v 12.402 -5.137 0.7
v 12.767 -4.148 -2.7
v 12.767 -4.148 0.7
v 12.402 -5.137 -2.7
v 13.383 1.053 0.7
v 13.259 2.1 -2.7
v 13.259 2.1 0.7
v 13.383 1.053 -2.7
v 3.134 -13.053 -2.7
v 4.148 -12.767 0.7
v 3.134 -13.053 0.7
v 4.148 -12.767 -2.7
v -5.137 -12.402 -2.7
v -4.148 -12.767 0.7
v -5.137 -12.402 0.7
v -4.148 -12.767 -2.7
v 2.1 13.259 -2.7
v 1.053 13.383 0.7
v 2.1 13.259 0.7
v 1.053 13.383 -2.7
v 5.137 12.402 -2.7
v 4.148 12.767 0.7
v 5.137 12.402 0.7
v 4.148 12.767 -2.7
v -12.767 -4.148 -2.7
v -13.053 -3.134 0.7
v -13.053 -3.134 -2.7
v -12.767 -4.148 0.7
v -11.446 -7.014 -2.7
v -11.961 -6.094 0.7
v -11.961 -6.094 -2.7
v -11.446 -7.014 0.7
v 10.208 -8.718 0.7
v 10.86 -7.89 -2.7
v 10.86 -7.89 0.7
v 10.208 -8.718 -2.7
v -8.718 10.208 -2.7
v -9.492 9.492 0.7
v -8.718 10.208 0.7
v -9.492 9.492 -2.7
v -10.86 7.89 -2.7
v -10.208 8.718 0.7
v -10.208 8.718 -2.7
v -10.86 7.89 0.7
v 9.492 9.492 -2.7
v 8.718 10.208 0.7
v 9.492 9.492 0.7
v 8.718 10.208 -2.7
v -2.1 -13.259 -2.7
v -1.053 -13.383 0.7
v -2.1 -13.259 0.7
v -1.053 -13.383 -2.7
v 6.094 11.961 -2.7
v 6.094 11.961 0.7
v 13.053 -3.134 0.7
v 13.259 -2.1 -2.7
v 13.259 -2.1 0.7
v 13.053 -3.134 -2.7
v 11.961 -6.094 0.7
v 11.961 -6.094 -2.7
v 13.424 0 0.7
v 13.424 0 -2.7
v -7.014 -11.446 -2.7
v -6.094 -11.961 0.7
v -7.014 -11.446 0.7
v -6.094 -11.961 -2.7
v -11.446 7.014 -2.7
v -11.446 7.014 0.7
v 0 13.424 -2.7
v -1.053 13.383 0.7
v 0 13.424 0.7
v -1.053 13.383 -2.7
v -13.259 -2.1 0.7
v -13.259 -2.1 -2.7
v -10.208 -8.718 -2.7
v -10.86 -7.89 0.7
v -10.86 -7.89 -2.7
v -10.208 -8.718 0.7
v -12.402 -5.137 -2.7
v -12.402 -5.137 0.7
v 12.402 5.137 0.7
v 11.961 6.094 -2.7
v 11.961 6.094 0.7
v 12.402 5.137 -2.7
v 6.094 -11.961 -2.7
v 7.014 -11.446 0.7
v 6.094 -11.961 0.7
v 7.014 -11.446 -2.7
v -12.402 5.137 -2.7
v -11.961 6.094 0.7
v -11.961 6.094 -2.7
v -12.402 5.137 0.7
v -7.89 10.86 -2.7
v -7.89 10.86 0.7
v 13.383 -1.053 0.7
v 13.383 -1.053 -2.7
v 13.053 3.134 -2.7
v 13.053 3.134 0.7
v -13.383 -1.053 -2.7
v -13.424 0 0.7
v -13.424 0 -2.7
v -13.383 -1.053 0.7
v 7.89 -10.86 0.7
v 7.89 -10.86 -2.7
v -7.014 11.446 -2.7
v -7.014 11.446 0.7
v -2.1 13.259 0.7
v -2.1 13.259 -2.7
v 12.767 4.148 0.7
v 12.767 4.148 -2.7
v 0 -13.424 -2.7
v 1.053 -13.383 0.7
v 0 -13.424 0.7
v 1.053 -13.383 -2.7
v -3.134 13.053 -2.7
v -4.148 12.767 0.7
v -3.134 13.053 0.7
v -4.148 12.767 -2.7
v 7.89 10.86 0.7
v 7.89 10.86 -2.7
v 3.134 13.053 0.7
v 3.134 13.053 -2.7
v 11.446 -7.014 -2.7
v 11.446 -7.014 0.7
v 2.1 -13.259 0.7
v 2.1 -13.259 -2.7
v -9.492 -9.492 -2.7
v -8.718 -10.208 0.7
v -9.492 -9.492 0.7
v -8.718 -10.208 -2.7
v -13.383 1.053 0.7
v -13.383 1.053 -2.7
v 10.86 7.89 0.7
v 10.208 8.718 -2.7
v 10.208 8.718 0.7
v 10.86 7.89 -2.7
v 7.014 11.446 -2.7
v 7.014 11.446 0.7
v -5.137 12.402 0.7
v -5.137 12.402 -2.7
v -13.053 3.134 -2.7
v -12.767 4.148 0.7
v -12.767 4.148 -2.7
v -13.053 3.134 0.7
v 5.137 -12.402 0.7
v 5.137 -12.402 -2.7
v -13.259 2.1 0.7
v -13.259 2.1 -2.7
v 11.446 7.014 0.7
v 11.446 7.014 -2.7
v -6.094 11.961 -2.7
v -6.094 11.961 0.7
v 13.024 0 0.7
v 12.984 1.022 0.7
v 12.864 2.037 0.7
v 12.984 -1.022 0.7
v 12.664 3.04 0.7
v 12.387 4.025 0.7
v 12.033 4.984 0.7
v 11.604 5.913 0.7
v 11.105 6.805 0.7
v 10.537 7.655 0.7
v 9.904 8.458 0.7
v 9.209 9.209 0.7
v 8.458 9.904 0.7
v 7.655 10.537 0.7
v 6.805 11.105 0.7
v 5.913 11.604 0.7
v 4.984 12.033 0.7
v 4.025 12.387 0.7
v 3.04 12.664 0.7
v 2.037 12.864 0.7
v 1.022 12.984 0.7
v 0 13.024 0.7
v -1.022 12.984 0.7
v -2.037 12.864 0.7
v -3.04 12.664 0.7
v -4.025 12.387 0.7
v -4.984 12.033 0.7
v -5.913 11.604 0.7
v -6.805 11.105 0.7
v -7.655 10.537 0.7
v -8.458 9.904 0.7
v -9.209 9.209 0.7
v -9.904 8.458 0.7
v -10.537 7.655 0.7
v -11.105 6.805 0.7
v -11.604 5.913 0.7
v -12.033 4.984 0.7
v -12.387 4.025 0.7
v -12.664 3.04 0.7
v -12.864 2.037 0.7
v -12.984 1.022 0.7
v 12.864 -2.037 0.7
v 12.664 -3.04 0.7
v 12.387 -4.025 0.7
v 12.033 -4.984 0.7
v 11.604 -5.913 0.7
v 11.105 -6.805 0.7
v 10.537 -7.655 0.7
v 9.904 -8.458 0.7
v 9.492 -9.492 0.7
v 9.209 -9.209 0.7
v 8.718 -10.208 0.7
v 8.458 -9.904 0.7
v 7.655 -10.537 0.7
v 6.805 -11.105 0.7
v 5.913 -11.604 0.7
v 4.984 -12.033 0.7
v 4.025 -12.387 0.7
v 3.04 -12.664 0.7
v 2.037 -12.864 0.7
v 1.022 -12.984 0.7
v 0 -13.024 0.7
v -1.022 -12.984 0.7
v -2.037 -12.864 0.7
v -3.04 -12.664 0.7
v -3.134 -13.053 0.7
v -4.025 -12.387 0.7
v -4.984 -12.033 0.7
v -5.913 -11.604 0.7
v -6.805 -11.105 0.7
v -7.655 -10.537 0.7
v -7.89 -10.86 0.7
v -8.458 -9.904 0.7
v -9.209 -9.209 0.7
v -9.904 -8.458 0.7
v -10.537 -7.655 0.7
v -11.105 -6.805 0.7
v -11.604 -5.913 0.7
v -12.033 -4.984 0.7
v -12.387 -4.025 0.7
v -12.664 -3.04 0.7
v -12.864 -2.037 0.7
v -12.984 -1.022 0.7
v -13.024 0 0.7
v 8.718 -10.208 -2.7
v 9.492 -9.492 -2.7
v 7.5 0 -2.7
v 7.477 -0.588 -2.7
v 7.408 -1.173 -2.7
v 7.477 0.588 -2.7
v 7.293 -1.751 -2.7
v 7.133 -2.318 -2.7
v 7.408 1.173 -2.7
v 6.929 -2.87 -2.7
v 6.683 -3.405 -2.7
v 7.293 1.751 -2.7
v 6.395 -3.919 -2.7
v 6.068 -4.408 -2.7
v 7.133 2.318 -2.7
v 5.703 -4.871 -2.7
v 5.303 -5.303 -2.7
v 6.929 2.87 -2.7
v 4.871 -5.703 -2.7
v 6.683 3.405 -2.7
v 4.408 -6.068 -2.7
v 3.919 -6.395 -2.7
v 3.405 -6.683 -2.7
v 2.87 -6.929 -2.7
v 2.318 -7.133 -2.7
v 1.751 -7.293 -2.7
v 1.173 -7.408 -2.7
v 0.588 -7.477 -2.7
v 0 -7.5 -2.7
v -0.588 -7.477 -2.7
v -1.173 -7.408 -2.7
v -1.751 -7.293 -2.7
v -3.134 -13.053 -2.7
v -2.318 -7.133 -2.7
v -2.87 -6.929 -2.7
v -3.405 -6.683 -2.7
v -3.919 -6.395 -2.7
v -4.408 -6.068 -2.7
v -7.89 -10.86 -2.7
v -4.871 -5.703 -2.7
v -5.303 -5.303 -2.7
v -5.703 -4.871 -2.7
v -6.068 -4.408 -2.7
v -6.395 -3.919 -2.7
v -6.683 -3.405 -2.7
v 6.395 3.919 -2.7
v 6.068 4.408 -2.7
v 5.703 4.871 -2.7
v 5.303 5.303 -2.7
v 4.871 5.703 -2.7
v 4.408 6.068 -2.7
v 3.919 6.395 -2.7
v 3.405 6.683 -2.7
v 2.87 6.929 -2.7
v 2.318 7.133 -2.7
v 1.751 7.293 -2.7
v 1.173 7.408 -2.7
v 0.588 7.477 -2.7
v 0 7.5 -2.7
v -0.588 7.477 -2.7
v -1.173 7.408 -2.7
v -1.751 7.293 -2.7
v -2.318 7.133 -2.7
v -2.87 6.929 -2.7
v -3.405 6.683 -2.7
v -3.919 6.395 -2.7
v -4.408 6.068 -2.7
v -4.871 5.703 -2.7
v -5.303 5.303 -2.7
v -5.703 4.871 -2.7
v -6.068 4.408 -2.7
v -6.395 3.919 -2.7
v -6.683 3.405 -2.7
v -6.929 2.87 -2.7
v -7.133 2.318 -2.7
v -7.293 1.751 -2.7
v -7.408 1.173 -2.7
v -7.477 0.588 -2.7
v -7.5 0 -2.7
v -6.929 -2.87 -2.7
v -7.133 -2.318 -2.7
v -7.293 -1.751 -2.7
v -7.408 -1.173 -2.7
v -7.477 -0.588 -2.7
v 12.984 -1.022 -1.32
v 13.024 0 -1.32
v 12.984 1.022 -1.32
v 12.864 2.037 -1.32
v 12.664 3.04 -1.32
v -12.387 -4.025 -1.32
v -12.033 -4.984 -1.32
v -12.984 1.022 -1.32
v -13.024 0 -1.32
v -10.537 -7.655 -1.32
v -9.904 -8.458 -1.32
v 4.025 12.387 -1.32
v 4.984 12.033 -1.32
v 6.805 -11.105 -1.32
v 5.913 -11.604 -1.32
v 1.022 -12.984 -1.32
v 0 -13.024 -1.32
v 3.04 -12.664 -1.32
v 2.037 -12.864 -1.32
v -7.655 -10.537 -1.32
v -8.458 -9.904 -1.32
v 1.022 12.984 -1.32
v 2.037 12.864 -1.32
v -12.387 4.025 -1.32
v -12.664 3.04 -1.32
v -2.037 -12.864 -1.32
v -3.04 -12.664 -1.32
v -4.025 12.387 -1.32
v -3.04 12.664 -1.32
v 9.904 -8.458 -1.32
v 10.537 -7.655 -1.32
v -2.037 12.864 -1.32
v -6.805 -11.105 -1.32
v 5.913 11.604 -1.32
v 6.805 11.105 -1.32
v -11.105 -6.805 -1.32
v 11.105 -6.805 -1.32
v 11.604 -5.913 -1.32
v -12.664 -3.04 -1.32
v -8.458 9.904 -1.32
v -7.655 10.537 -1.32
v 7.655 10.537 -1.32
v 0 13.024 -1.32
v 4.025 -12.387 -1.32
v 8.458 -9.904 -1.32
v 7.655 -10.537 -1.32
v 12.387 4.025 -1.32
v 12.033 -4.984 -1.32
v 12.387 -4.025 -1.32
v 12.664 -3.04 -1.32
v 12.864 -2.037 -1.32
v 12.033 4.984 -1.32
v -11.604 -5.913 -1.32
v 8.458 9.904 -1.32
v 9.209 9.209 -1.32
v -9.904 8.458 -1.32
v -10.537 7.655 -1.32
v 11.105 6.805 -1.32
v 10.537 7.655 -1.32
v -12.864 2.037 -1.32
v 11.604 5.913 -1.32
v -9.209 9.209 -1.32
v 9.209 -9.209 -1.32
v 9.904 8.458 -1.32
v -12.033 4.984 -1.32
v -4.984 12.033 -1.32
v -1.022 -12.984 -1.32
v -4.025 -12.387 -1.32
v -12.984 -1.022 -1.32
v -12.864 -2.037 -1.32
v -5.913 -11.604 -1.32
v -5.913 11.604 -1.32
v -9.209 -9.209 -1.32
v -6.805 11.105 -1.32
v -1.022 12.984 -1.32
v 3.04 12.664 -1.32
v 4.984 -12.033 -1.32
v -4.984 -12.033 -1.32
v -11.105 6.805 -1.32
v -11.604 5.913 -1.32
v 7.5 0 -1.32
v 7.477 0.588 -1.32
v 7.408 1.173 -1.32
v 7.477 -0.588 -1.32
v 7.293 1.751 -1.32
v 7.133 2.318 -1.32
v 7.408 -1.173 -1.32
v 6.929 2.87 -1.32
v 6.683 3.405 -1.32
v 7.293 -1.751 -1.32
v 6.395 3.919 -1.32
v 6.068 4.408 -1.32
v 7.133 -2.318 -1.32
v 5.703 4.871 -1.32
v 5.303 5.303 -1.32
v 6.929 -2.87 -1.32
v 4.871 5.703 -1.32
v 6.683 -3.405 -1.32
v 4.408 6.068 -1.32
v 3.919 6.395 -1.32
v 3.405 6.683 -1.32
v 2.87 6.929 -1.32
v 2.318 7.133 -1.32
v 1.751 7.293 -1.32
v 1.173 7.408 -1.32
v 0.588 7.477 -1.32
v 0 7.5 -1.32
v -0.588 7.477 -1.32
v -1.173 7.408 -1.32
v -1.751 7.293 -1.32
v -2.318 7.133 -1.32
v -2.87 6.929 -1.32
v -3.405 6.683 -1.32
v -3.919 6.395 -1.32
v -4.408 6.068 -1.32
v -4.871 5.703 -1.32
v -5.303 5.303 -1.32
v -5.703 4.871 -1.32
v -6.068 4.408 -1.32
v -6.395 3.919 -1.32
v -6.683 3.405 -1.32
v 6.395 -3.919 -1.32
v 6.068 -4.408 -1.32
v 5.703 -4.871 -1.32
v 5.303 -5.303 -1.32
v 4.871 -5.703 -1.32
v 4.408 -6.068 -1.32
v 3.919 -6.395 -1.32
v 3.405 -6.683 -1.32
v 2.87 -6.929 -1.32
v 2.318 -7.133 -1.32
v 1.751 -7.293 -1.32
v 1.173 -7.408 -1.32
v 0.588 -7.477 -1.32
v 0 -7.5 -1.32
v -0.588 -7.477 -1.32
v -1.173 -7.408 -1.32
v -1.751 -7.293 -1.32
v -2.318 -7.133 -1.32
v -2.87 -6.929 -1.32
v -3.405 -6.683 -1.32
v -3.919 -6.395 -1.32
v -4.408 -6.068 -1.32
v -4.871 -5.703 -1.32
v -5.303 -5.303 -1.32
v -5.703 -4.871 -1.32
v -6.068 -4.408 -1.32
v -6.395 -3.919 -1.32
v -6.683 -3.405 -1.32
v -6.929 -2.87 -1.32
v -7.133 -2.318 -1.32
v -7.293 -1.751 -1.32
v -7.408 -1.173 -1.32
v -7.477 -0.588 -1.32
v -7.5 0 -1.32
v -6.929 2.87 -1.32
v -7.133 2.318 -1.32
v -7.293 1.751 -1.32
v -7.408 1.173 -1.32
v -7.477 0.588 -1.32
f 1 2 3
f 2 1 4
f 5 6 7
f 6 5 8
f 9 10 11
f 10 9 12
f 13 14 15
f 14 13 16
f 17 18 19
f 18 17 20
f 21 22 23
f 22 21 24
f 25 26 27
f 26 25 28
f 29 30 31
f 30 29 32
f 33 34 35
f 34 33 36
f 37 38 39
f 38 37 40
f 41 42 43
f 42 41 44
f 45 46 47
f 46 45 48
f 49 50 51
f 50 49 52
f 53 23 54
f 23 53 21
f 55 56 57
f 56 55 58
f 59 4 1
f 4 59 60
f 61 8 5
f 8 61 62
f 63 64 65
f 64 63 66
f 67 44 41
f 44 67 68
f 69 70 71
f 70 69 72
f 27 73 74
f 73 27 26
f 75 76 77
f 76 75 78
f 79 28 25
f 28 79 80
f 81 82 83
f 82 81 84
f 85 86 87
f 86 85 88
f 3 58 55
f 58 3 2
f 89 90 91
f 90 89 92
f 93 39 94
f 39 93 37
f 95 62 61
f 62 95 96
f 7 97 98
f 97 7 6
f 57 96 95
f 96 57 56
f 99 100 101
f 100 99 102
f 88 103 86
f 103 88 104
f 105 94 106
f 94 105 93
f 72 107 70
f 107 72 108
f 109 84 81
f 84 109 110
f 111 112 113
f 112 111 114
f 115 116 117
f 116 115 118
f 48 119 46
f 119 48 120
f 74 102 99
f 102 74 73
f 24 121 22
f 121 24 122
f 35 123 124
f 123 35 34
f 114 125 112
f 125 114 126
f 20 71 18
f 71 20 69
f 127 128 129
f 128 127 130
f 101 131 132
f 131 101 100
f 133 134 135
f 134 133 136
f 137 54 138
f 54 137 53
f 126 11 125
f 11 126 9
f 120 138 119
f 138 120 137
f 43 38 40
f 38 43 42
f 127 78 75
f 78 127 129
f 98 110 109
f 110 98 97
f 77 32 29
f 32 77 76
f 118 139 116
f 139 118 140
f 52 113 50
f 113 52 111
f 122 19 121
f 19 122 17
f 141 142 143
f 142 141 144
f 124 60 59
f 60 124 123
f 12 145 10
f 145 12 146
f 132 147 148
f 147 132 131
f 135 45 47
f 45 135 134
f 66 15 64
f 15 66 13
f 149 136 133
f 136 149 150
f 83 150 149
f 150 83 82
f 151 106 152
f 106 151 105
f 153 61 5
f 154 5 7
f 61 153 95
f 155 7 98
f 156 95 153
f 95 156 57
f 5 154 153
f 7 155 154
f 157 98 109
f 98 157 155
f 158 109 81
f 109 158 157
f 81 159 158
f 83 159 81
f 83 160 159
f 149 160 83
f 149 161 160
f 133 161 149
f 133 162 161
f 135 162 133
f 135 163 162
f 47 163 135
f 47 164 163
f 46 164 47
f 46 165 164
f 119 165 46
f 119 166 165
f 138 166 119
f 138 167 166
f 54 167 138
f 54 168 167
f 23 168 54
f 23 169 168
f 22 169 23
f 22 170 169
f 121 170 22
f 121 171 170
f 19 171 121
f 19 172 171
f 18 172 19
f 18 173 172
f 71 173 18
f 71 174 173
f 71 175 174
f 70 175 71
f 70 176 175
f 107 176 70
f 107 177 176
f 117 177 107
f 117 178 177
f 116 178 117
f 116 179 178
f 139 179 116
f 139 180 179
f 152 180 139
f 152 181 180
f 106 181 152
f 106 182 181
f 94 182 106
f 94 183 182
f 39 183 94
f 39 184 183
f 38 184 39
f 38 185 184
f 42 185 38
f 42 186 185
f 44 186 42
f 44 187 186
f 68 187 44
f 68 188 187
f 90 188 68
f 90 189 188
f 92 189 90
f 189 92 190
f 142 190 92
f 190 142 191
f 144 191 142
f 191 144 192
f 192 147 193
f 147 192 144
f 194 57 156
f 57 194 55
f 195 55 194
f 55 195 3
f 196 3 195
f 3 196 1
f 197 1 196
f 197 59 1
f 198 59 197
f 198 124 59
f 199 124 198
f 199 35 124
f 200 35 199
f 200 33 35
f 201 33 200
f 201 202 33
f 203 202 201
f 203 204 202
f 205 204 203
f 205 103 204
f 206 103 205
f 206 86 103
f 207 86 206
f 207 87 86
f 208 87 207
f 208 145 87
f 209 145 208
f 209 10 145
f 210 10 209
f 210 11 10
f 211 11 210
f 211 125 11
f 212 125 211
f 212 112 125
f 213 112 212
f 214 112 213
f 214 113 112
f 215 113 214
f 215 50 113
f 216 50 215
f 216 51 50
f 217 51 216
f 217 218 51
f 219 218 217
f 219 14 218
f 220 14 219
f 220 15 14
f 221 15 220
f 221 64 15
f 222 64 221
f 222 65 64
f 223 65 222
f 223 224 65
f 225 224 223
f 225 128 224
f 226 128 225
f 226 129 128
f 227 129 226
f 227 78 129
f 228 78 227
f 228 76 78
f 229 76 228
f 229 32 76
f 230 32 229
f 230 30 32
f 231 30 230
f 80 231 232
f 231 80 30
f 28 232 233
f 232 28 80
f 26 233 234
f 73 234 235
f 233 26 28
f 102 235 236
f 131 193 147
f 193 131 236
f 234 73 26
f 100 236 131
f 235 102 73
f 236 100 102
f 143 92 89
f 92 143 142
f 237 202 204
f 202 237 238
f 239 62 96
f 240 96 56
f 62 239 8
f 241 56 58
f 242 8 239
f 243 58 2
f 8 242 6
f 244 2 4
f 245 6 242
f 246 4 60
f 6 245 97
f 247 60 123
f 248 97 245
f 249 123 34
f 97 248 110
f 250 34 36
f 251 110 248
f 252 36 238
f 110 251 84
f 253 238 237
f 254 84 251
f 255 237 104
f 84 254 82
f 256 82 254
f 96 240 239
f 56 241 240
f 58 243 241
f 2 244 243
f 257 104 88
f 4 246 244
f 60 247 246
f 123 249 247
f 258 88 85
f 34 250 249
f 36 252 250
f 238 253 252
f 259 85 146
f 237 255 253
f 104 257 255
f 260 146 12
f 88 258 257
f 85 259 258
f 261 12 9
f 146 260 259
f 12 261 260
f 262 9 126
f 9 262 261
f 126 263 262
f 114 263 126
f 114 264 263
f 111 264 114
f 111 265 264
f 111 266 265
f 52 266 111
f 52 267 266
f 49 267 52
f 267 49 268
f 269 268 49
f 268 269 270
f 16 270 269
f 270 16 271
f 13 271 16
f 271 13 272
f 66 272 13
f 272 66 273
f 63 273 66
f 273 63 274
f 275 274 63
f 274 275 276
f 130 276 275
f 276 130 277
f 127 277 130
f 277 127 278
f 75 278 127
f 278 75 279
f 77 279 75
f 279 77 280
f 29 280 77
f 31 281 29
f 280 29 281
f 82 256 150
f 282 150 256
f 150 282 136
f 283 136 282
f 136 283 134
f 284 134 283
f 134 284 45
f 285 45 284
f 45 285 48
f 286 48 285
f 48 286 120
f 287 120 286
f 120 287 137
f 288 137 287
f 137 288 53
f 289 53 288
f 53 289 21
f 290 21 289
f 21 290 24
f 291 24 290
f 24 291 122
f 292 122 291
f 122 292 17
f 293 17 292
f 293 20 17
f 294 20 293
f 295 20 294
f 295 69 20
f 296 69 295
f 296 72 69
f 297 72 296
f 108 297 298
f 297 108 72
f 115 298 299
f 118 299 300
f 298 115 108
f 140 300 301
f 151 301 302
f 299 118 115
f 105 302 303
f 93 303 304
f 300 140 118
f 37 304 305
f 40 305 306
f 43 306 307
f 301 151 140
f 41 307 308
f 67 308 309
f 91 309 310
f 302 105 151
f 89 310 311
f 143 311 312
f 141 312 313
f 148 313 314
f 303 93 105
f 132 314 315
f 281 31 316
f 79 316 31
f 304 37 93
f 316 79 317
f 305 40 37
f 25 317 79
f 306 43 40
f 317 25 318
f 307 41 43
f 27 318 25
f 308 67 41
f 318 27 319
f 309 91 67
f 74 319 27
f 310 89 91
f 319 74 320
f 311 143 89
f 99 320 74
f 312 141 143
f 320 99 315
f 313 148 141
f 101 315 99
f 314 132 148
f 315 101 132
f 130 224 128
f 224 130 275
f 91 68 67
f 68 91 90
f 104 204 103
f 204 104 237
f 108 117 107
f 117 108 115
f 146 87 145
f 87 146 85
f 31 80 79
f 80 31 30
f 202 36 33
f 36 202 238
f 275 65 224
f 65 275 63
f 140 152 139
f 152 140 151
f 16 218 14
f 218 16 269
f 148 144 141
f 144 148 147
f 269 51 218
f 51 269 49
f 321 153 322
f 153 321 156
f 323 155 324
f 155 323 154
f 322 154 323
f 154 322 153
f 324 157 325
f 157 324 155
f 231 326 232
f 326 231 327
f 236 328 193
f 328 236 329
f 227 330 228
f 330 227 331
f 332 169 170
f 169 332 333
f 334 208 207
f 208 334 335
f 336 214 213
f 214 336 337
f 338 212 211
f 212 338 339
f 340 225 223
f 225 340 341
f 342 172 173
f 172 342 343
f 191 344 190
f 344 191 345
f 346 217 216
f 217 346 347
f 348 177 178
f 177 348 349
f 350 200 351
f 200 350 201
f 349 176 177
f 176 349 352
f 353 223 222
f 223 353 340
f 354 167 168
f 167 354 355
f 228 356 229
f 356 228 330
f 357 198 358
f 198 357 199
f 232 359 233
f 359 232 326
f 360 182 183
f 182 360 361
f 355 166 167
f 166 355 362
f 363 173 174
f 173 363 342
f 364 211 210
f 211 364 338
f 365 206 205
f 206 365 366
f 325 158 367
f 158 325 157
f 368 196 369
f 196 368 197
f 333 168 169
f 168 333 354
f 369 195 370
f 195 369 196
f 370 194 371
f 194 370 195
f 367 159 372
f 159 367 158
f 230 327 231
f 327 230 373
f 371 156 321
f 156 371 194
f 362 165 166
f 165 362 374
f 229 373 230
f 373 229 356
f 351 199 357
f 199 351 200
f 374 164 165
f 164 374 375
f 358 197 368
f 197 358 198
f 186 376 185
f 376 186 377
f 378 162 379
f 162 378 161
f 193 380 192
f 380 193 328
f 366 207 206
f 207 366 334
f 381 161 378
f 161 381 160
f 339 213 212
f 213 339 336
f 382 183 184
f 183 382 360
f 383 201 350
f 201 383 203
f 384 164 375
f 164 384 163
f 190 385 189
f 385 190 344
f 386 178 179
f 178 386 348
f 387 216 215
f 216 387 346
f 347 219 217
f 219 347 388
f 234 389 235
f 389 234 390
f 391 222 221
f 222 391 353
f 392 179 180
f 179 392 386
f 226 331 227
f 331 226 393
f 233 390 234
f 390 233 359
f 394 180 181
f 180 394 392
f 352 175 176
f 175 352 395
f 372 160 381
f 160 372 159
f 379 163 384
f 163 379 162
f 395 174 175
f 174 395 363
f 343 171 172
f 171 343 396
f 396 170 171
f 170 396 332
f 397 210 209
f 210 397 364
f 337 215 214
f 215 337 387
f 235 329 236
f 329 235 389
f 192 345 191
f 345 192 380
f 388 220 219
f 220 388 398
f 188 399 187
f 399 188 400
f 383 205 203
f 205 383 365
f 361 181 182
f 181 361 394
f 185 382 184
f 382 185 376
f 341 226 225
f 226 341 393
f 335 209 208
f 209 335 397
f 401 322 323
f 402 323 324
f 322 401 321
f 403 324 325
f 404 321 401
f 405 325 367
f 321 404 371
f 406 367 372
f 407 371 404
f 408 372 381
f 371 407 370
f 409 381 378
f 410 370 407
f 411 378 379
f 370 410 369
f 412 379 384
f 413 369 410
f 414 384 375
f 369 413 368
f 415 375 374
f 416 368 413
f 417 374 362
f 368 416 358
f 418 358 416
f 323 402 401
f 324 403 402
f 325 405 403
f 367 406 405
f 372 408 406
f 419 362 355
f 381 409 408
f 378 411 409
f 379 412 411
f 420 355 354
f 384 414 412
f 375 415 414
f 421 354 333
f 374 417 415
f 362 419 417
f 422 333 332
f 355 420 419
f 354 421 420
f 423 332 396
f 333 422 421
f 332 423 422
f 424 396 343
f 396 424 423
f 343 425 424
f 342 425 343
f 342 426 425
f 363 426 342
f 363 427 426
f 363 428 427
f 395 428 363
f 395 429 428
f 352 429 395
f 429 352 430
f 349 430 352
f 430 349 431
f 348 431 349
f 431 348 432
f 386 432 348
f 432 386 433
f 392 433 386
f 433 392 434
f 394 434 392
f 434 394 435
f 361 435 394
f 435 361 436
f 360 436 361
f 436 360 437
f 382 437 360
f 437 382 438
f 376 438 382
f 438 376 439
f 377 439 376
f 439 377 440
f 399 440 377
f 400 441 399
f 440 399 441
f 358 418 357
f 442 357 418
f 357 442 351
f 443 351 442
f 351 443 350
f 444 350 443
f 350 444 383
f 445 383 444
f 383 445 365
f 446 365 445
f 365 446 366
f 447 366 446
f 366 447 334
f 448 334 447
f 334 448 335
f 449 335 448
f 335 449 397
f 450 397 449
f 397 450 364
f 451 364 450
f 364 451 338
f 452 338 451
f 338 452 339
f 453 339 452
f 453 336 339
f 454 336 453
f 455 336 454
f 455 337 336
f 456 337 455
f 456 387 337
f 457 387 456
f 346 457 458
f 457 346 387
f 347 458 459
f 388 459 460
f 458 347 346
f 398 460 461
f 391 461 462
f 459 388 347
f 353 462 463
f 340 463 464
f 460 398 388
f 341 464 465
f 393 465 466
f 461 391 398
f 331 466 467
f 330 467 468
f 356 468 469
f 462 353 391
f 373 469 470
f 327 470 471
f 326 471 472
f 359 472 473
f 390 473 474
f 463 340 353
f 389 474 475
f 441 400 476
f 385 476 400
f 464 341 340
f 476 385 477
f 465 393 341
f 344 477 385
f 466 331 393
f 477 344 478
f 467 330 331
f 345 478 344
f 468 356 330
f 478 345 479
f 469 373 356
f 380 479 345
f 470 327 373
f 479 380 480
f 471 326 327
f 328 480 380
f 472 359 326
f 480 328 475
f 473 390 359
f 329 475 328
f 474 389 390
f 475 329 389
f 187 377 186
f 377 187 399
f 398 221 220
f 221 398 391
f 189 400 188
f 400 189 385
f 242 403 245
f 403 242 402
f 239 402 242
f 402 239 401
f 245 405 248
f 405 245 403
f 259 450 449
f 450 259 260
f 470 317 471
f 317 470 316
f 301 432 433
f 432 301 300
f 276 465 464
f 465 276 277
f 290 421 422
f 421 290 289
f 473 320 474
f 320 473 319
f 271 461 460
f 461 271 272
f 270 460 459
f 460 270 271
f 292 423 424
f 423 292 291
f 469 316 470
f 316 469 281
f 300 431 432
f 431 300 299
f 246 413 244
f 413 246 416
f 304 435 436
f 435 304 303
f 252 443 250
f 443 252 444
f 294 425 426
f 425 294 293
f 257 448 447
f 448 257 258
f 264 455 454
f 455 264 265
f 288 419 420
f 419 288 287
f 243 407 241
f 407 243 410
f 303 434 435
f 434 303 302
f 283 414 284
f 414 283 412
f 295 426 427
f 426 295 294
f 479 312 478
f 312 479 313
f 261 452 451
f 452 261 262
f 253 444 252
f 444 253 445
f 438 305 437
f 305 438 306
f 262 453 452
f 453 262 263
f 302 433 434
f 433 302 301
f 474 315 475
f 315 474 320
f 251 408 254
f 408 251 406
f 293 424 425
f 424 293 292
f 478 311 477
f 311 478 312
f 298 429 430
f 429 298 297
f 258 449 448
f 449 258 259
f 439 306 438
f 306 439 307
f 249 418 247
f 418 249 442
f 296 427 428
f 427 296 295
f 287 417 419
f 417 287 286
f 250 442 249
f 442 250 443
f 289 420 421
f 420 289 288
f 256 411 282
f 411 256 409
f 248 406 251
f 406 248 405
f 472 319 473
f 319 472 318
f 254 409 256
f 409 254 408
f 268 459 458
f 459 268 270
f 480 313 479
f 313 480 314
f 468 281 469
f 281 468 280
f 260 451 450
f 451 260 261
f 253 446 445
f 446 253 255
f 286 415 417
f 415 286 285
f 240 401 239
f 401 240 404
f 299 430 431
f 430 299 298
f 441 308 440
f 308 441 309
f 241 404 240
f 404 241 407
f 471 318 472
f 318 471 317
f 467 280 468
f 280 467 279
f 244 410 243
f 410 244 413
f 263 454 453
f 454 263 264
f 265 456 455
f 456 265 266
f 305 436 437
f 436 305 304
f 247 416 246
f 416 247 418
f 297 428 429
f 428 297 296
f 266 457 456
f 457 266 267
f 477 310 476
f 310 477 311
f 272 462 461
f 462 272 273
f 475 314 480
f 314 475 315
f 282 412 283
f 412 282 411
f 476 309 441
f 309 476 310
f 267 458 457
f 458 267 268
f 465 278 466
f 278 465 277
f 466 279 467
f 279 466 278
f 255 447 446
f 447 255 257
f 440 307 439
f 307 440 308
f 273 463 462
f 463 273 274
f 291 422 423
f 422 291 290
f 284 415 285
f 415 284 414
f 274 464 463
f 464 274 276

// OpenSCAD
height = 2.4;
internal_diameter=25.248;
hole_diameter=15;
thickness=1.6;
printer_margin=0.8;

internal_diameter_with_margin=internal_diameter+printer_margin;
external_diameter=internal_diameter+thickness;


difference() {
translate([0,0,-1])
cylinder(height+1, external_diameter/2, external_diameter/2, center=true, $fn=80);
color("red")
cylinder(height*1.1, internal_diameter_with_margin/2, internal_diameter_with_margin/2, center=true, $fn=80);
translate([0,0,-2])
    cylinder(height+2, hole_diameter/2, hole_diameter/2, center=true, $fn=80);
}
